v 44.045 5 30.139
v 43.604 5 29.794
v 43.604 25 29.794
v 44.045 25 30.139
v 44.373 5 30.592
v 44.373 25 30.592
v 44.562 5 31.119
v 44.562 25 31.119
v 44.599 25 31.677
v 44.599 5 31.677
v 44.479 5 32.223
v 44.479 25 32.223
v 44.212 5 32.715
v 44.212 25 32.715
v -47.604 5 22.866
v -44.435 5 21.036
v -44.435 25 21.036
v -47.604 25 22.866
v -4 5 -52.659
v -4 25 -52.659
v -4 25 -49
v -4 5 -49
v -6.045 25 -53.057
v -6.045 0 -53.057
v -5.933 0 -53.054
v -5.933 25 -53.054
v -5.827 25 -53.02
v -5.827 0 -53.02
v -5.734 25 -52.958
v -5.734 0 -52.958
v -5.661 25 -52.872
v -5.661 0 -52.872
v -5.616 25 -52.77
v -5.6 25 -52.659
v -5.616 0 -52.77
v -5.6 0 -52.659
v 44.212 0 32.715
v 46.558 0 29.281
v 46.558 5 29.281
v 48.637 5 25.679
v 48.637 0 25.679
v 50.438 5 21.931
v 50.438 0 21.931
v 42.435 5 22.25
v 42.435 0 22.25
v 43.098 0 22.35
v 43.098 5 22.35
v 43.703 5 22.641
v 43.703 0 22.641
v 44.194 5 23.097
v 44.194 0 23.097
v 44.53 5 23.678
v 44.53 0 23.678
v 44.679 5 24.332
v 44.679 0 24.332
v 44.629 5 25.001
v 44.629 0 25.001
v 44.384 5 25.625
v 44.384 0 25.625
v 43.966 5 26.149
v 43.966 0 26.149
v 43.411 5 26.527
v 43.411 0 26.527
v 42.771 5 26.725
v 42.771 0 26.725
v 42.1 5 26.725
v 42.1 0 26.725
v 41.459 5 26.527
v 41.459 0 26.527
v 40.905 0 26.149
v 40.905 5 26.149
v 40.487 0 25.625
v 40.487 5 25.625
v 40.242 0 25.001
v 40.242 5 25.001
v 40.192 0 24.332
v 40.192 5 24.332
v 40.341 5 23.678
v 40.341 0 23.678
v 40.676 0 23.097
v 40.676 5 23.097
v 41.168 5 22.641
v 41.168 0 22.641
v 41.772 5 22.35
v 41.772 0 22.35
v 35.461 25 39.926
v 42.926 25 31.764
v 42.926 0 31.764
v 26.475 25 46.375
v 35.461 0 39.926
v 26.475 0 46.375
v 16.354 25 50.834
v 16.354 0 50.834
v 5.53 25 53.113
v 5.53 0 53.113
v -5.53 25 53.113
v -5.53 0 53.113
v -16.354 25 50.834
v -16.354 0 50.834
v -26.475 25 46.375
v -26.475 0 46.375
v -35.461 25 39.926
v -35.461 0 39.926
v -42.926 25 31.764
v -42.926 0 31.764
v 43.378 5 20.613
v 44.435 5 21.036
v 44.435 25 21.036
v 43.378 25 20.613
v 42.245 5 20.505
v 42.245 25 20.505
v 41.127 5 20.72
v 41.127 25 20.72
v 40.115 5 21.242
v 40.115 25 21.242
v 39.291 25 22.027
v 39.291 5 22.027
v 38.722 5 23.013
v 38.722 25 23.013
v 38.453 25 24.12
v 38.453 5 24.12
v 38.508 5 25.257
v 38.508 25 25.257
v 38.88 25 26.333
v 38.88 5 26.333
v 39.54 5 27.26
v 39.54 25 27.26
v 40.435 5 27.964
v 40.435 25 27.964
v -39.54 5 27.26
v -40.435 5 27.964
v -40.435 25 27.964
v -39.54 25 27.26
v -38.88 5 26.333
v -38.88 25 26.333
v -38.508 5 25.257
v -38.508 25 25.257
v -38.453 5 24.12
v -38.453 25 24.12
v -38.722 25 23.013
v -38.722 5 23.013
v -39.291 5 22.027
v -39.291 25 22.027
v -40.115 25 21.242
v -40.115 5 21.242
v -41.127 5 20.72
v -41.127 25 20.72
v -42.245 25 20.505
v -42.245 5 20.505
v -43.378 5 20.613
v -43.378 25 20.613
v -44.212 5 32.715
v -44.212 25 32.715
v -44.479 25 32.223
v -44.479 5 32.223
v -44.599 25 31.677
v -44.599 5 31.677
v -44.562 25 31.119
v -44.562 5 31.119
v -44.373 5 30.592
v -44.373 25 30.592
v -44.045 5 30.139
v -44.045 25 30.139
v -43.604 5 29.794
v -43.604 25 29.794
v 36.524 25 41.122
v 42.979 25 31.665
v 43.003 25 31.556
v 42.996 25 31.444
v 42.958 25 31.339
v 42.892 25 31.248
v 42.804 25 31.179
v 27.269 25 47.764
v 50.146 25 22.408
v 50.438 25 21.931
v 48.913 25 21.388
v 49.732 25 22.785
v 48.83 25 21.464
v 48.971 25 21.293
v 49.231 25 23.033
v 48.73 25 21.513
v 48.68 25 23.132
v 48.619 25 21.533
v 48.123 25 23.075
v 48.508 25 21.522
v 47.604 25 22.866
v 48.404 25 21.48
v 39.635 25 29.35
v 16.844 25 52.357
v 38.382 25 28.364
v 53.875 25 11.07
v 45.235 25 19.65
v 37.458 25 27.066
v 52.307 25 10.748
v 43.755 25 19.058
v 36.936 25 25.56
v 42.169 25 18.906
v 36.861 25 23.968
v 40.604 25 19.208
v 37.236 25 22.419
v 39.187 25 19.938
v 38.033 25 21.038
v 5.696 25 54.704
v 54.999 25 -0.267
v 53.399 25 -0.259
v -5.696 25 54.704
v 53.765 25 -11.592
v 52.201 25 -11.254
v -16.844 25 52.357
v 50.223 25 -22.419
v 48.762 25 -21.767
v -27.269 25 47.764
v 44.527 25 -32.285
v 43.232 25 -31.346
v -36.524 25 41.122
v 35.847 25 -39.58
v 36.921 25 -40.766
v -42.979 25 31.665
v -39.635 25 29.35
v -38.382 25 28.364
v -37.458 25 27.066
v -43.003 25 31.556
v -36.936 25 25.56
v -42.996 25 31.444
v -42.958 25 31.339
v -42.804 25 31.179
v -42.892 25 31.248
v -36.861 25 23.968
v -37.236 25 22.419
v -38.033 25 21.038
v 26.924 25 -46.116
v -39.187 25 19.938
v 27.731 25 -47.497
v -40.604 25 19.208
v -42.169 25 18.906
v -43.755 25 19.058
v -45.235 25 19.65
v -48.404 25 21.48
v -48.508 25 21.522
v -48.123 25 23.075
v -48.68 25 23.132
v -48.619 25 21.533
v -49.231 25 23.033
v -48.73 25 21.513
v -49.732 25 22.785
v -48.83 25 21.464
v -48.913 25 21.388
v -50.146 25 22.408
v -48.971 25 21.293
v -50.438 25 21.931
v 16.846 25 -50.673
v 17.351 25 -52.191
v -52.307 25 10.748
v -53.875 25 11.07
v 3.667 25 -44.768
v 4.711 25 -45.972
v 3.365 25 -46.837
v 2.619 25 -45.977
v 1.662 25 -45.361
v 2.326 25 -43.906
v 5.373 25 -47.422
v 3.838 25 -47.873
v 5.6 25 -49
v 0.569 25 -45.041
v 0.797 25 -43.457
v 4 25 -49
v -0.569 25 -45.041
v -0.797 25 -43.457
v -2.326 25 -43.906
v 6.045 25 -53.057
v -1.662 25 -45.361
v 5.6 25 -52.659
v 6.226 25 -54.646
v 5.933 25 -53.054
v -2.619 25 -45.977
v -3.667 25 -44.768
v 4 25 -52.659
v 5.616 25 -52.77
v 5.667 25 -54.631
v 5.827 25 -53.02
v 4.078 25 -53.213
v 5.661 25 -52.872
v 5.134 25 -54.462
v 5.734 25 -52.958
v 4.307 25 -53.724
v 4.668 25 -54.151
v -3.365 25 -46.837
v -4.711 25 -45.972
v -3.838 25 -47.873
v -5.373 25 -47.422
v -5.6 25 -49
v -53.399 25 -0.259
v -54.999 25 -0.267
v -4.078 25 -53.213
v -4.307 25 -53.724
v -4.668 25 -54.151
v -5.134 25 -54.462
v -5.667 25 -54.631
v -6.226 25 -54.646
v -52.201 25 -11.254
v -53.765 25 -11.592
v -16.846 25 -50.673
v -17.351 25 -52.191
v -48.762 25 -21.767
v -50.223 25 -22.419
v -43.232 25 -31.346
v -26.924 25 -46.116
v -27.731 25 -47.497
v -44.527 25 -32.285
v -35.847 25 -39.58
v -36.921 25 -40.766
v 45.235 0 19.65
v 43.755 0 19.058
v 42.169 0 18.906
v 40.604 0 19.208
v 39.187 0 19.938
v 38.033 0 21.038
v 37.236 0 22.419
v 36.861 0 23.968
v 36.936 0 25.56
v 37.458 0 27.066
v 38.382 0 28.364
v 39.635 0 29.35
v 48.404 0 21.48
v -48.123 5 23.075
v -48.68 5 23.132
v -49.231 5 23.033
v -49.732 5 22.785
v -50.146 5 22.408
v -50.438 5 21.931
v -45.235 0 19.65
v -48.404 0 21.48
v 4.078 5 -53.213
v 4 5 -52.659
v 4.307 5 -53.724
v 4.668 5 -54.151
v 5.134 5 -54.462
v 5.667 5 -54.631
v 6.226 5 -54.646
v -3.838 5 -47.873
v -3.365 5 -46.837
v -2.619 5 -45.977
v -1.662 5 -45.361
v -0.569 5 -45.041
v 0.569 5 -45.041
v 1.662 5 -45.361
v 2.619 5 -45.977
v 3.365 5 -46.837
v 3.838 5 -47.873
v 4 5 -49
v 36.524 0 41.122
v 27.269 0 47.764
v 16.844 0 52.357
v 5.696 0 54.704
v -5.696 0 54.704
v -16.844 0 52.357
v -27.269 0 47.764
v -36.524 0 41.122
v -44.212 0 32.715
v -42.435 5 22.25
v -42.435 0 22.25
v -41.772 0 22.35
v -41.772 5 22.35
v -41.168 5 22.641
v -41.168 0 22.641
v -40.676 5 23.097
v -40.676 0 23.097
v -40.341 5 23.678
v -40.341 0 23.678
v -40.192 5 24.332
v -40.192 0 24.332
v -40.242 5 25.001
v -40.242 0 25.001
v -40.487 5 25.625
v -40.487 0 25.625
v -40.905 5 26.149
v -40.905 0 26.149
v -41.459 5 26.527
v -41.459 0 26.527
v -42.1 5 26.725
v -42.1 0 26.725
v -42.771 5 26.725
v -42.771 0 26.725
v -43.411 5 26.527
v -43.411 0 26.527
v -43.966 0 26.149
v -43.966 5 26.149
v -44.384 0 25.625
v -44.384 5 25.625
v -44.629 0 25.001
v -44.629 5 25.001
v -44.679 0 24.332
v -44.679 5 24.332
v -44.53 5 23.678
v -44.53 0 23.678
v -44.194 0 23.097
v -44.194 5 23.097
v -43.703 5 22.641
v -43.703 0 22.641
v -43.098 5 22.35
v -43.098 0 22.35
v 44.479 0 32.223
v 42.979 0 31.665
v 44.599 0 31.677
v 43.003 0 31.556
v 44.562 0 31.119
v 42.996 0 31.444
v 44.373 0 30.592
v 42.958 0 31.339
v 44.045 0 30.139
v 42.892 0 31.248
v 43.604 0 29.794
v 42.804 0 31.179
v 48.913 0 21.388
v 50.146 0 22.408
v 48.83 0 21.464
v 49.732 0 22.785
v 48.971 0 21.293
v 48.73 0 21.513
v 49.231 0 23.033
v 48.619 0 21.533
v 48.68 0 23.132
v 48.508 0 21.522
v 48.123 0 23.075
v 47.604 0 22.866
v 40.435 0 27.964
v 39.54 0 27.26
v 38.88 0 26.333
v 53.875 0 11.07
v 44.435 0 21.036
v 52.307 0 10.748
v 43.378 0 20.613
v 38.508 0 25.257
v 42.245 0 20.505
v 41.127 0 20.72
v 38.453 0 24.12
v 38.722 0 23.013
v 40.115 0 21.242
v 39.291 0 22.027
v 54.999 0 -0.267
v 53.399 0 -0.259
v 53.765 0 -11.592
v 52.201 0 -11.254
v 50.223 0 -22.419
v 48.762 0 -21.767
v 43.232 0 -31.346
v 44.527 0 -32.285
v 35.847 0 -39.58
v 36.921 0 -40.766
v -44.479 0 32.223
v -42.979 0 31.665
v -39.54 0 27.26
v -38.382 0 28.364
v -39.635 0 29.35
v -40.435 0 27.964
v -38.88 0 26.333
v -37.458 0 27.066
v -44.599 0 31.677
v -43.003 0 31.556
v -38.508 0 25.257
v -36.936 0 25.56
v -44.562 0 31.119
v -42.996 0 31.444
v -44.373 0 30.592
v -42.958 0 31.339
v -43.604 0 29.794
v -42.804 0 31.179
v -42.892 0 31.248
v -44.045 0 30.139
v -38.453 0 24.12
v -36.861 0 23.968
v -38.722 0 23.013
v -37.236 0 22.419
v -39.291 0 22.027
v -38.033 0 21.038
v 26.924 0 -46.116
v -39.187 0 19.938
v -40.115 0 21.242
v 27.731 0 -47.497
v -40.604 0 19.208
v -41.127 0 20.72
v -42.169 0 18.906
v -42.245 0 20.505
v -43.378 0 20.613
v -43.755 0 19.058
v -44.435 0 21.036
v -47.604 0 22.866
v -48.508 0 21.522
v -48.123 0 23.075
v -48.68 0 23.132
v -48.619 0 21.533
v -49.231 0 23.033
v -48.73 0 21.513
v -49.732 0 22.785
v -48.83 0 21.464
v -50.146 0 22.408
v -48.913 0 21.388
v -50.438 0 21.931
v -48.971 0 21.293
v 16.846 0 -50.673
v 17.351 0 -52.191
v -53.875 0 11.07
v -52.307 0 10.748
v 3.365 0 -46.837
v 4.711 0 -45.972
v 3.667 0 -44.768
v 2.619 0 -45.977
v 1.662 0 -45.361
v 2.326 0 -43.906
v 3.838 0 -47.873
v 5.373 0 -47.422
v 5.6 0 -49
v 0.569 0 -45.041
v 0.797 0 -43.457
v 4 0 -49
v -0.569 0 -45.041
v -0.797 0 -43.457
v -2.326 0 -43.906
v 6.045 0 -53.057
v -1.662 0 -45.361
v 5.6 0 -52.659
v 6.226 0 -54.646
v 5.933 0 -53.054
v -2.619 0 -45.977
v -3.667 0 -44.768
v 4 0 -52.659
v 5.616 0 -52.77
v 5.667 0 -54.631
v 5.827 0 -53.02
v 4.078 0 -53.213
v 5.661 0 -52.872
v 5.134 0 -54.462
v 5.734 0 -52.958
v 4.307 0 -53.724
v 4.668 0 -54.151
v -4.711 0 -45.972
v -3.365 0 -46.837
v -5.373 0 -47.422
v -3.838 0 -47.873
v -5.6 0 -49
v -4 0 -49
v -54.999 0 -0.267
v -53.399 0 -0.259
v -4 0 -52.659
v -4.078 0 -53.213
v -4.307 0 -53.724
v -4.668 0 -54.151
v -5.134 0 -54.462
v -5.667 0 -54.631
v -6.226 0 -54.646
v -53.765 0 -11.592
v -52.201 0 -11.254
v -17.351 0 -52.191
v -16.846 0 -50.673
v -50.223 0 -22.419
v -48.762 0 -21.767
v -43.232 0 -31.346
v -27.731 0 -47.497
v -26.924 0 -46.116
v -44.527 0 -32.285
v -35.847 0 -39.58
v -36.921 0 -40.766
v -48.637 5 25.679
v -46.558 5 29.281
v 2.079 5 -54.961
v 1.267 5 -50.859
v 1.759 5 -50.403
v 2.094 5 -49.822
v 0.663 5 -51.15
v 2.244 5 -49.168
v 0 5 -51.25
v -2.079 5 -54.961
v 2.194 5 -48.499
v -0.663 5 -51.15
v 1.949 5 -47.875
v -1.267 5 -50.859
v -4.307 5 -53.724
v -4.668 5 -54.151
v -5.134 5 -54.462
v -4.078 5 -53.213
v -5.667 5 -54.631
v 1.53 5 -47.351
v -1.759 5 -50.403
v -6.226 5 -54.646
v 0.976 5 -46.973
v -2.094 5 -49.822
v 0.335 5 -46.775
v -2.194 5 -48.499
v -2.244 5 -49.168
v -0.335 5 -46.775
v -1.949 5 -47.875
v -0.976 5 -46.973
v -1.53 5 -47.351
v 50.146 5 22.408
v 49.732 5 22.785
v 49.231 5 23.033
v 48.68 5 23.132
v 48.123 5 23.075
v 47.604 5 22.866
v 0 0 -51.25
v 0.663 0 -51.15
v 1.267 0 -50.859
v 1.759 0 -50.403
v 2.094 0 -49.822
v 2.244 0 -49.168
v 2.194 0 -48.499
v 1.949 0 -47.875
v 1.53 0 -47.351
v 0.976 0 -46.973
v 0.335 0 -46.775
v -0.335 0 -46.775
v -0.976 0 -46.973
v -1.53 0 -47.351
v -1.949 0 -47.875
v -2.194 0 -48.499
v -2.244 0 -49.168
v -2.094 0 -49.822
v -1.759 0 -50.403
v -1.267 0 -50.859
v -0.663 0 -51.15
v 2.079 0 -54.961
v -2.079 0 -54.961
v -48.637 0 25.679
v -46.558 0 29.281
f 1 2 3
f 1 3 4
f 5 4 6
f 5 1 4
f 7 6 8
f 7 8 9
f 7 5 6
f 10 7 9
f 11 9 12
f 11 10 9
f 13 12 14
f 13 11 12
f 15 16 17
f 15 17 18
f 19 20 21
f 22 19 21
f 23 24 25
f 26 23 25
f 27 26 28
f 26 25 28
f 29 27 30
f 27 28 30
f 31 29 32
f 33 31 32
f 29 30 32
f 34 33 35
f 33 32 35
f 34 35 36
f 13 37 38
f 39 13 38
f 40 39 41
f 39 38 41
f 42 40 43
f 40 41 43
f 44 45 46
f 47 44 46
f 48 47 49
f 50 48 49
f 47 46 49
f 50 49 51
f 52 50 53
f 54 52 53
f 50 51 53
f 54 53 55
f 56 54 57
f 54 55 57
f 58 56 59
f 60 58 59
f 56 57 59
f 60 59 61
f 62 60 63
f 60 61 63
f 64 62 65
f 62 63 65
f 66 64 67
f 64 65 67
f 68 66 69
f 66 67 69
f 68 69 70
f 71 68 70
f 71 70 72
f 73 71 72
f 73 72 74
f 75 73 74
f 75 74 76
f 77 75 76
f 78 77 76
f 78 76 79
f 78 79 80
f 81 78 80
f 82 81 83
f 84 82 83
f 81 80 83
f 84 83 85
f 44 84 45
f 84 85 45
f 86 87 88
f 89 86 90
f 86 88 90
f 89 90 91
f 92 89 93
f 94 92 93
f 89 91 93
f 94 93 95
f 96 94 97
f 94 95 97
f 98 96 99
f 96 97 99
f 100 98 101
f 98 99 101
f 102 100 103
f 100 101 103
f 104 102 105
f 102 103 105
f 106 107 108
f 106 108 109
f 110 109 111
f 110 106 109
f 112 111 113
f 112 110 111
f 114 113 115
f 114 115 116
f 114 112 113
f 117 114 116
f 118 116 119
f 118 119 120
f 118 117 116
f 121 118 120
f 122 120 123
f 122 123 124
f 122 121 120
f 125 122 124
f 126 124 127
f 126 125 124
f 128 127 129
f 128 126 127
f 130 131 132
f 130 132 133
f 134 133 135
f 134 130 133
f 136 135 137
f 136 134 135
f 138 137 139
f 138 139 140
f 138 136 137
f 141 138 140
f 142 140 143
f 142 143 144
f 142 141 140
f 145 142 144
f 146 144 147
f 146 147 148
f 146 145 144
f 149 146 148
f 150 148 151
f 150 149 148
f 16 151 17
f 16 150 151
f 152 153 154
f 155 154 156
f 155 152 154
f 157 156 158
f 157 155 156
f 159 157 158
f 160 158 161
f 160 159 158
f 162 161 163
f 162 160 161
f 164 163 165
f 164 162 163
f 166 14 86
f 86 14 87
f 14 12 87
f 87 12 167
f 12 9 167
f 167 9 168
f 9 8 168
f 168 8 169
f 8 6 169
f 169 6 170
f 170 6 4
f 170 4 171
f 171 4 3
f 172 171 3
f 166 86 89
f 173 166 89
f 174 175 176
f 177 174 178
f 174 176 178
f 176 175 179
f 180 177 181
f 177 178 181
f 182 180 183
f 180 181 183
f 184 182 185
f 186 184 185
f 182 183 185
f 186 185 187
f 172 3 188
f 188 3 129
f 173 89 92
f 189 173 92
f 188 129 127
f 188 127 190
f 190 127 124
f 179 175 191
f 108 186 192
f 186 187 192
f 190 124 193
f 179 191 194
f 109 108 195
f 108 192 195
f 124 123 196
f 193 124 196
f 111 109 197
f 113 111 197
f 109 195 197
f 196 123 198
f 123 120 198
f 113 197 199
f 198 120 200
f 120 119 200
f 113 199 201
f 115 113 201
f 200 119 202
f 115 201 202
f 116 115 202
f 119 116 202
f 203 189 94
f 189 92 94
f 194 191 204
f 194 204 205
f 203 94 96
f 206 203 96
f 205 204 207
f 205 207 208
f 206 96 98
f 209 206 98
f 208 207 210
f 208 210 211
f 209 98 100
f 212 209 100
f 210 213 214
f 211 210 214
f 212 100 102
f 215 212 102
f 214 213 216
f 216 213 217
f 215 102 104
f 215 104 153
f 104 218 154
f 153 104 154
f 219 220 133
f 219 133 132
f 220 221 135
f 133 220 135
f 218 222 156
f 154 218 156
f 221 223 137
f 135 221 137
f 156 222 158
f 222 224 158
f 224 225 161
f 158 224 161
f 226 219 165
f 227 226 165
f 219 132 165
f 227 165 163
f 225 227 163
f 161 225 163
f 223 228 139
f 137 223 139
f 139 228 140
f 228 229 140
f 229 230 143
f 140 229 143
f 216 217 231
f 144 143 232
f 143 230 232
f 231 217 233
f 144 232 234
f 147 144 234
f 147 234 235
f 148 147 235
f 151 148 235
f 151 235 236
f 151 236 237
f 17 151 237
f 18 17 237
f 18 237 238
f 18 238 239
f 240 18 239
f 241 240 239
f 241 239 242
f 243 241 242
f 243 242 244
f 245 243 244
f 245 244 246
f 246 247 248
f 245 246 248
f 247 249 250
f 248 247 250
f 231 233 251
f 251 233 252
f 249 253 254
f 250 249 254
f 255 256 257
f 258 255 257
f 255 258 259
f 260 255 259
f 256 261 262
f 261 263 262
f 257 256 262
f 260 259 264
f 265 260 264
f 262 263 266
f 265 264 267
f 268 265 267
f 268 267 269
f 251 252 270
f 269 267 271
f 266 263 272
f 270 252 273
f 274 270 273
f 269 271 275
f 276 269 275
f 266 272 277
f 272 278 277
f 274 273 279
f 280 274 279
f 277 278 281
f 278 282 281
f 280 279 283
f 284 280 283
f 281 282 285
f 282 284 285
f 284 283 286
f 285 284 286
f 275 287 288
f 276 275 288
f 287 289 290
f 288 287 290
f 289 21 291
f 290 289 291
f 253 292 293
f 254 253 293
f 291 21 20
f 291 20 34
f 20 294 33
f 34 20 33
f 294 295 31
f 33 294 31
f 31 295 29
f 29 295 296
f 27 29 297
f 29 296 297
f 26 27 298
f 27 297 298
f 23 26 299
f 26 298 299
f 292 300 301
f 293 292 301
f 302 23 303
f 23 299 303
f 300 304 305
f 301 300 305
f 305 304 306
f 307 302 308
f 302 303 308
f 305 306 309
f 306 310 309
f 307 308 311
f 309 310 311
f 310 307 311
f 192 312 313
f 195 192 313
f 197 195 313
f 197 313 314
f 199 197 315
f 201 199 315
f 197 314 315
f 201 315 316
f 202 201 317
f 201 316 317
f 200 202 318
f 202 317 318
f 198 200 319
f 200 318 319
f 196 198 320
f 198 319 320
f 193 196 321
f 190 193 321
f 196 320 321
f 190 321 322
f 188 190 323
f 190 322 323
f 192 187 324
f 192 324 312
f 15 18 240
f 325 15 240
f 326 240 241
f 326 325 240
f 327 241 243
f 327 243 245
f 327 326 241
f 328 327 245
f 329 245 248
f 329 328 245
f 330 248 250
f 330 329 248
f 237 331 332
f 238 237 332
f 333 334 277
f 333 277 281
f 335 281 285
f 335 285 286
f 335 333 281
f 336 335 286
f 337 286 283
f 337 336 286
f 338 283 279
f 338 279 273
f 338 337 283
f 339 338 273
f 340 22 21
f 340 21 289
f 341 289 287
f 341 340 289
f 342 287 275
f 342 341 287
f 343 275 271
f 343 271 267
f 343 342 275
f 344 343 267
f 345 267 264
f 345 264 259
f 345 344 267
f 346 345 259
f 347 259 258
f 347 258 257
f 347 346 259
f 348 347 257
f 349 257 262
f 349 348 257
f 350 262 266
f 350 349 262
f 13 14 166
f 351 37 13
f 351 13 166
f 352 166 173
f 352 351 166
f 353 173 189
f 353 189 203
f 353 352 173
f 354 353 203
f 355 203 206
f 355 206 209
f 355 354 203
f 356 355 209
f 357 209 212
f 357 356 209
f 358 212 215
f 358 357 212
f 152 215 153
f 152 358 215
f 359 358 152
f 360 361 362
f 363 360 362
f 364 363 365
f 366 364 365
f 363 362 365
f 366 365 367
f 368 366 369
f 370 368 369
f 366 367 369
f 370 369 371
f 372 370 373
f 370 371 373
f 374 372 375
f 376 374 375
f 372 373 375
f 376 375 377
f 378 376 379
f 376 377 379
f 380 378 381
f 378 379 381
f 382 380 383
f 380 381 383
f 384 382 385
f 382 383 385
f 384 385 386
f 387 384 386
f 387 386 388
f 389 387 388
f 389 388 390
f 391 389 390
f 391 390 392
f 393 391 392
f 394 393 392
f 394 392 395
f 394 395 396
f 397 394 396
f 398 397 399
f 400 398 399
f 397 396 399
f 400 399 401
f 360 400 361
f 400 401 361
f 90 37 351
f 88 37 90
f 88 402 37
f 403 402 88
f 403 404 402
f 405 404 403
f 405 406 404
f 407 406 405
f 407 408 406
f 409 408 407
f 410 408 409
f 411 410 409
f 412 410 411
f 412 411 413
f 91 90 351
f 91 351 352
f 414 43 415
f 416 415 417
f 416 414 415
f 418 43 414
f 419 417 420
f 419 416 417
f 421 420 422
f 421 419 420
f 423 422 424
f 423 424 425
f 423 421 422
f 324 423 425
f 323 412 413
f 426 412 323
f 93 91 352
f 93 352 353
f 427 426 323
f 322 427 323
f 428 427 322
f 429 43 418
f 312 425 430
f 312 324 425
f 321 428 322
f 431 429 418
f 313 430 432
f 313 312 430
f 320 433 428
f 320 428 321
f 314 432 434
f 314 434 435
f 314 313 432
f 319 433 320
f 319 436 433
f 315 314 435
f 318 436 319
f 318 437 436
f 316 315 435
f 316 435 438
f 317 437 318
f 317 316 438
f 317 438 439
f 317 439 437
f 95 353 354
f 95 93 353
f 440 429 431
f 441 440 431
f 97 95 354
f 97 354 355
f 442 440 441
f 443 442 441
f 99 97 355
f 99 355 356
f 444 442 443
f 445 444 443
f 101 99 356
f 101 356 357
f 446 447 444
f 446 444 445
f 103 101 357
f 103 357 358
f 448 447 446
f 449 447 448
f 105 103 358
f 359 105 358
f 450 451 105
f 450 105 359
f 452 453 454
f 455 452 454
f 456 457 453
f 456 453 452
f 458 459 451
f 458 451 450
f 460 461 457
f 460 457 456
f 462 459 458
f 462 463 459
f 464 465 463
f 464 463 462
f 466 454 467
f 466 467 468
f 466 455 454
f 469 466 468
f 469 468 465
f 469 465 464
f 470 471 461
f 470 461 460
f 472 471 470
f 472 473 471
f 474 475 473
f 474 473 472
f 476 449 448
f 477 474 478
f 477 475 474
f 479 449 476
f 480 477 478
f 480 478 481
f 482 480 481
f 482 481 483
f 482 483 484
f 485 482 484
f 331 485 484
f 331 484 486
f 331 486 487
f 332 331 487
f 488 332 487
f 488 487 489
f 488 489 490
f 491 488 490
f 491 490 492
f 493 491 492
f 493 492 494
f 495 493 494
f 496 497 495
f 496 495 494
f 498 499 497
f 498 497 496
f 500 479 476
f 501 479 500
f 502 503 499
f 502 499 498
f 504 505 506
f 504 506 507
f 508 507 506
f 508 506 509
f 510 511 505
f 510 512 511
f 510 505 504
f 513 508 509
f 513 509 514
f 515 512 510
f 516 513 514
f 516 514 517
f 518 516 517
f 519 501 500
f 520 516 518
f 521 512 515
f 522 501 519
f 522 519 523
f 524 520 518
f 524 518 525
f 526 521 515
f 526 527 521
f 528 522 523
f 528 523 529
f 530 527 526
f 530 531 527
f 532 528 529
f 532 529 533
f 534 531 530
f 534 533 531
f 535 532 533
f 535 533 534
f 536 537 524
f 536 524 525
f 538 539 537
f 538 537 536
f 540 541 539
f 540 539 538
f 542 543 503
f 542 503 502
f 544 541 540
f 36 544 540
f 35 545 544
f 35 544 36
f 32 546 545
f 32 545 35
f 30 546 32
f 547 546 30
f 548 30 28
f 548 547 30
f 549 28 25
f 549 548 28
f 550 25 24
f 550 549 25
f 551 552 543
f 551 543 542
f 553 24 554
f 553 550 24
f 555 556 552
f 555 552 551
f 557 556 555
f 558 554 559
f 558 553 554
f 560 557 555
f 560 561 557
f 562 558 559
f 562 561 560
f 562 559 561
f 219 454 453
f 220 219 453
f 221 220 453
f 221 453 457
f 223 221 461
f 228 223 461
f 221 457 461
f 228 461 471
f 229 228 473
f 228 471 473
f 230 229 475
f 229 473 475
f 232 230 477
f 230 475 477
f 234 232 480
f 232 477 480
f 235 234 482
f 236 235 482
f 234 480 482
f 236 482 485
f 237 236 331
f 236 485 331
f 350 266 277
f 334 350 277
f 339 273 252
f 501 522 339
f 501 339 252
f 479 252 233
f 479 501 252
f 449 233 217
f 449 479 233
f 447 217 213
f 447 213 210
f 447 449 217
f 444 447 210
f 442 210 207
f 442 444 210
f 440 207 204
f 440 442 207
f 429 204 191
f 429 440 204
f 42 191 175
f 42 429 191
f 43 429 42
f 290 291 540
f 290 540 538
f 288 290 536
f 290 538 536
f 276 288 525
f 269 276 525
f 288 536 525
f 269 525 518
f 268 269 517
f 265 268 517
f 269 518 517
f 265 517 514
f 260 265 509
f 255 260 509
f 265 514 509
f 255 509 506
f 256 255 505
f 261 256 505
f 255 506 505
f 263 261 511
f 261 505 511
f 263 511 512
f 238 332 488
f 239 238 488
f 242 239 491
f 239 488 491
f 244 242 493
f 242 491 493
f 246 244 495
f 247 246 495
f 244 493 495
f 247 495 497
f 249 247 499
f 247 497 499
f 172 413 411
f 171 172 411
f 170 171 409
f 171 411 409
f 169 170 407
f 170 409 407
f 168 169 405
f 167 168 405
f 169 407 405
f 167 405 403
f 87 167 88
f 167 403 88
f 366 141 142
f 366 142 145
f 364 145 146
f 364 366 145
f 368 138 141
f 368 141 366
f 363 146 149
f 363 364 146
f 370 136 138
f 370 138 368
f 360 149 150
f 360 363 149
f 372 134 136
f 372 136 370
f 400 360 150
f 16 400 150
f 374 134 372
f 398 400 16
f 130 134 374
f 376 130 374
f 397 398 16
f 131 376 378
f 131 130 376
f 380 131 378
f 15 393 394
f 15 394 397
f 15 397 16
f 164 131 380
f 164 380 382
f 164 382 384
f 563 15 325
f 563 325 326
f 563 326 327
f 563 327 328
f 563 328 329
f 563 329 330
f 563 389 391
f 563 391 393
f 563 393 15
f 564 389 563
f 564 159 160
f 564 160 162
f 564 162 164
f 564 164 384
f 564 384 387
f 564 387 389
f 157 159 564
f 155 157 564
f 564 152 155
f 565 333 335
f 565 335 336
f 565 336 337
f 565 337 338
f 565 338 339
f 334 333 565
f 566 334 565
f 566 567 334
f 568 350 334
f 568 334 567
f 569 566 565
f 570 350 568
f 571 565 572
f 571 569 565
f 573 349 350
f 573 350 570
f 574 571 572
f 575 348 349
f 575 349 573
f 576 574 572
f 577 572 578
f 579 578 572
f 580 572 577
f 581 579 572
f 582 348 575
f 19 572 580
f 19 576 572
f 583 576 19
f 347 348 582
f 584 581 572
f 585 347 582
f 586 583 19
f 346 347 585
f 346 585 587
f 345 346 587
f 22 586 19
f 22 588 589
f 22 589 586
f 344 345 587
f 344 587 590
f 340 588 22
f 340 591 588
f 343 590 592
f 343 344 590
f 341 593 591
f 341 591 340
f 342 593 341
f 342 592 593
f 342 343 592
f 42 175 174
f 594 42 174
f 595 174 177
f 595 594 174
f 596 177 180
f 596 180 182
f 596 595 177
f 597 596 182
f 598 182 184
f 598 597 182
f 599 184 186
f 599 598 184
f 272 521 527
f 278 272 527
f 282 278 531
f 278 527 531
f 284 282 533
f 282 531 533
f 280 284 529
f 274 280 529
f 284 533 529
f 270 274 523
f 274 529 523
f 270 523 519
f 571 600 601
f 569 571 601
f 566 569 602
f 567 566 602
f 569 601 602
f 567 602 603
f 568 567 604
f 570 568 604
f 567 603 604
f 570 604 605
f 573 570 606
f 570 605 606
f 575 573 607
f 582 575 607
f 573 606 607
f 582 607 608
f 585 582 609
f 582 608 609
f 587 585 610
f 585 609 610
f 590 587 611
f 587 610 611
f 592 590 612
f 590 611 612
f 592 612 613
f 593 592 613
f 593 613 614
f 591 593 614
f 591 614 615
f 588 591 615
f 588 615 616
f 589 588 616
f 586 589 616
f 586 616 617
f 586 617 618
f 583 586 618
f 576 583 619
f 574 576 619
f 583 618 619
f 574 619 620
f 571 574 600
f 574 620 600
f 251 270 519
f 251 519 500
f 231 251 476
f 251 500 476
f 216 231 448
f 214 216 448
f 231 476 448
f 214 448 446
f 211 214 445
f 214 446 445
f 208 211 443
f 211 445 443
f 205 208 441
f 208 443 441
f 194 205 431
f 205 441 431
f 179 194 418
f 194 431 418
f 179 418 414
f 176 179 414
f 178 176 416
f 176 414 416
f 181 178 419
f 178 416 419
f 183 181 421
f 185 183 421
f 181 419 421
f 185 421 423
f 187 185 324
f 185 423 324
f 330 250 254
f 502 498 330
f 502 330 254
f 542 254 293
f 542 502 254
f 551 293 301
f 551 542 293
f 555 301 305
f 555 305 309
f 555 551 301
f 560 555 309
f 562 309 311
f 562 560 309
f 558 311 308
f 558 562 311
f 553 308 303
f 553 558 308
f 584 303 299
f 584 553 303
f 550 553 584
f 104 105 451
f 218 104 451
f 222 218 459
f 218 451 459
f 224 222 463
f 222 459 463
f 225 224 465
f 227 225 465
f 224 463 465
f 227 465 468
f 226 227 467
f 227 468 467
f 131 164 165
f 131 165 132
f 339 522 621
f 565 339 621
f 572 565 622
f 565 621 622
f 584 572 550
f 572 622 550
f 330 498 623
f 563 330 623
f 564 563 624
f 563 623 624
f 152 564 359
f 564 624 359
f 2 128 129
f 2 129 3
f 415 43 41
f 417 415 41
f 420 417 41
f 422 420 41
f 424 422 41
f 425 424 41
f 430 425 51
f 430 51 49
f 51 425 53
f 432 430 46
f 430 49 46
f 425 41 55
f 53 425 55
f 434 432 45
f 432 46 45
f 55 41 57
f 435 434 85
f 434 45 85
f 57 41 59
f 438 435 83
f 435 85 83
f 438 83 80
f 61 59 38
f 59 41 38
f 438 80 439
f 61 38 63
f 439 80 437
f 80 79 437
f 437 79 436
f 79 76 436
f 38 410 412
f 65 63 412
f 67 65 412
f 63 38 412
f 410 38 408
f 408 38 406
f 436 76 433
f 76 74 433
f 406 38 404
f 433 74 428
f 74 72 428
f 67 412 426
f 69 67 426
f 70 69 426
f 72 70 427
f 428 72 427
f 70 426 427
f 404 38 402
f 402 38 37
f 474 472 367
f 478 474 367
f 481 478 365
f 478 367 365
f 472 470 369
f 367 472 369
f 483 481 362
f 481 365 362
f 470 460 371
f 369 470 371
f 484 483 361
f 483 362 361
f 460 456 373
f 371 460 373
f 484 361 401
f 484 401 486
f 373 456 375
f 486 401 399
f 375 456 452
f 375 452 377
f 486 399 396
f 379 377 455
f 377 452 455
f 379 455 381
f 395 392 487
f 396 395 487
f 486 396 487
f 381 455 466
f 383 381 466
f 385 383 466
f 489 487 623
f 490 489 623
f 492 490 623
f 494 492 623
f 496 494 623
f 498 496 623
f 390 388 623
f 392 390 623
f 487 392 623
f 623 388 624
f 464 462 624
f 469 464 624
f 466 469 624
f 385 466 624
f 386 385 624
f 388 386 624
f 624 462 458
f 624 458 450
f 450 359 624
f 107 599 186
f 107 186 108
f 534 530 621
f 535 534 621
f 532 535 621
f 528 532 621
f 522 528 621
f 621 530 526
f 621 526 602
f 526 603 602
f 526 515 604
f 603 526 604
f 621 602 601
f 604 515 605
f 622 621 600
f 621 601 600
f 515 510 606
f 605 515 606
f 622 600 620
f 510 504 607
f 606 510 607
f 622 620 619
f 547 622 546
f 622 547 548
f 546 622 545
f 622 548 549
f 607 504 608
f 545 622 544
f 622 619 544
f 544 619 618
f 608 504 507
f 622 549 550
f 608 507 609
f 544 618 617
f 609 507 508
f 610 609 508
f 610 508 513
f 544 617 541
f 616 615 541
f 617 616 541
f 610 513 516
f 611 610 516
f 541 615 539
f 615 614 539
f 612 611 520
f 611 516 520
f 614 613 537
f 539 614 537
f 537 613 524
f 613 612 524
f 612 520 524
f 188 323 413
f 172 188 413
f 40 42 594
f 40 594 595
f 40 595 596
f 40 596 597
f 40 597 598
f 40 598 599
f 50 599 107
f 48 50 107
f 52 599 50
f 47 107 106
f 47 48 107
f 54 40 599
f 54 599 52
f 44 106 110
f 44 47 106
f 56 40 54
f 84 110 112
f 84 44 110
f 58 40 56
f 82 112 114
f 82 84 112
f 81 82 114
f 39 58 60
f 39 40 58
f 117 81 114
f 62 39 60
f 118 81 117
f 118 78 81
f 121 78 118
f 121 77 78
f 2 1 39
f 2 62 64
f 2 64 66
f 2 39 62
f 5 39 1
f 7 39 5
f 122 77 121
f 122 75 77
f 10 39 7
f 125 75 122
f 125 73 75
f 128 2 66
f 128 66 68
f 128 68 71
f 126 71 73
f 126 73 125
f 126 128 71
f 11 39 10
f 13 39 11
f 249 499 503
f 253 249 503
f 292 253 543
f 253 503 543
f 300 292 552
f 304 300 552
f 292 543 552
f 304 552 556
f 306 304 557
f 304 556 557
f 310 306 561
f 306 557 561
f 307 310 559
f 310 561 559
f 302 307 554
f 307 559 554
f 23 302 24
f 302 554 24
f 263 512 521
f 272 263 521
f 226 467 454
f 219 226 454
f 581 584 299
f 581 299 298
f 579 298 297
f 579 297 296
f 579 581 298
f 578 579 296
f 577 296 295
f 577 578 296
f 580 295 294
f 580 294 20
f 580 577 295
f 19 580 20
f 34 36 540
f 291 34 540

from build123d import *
from build123d.topology import SkipClean

# Parameters (mm, degrees)
EXTRUDE_THIN1_DEPTH = 25
SKETCH3_R           = 2.25
BOSS_EXTRUDE1_DEPTH = 5


with BuildPart() as part:
    # Sketch2 → Extrude-Thin1 (new body)
    with BuildSketch(Plane(origin=(0, 0, 0), x_dir=(1, 0, 0), z_dir=(0, 1, 0))):
        with BuildLine():
            Line((-4, 52.659282183), (-4, 49))
            ThreePointArc((-4, 49), (0, 45), (4, 49))
            Line((4, 49), (4, 52.659282183))
            ThreePointArc((4, 52.659282183), (4.668239922, 54.151399837), (6.226415094, 54.646424907))
            ThreePointArc((6.226415094, 54.646424907), (47.631397208, 27.5), (50.438399742, -21.930978807))
            ThreePointArc((50.438399742, -21.930978807), (49.23060787, -23.032885555), (47.604276115, -22.865539476))
            Line((47.604276115, -22.865539476), (44.435244785, -21.035898385))
            ThreePointArc((44.435244785, -21.035898385), (38.97114317, -22.5), (40.435244785, -27.964101615))
            Line((40.435244785, -27.964101615), (43.604276115, -29.793742707))
            ThreePointArc((43.604276115, -29.793742707), (44.562367948, -31.118514282), (44.211984648, -32.7154461))
            ThreePointArc((44.211984648, -32.7154461), (0, -55), (-44.211984648, -32.715446099))
            ThreePointArc((-44.211984648, -32.715446099), (-44.562367948, -31.118514282), (-43.604276115, -29.793742706))
            Line((-43.604276115, -29.793742706), (-40.435244785, -27.964101615))
            ThreePointArc((-40.435244785, -27.964101615), (-38.97114317, -22.5), (-44.435244785, -21.035898385))
            Line((-44.435244785, -21.035898385), (-47.604276115, -22.865539476))
            ThreePointArc((-47.604276115, -22.865539476), (-49.23060787, -23.032885555), (-50.438399742, -21.930978807))
            ThreePointArc((-50.438399742, -21.930978807), (-47.631397208, 27.5), (-6.226415094, 54.646424907))
            ThreePointArc((-6.226415094, 54.646424907), (-4.668239922, 54.151399837), (-4, 52.659282183))
        make_face()
        with BuildLine():
            Line((-5.6, 52.659282183), (-5.6, 49))
            ThreePointArc((-5.6, 49), (0, 43.4), (5.6, 49))
            Line((5.6, 49), (5.6, 52.659282183))
            ThreePointArc((5.6, 52.659282183), (5.733647984, 52.957705714), (6.045283019, 53.056710728))
            ThreePointArc((6.045283019, 53.056710728), (46.245756562, 26.7), (48.971100841, -21.292986696))
            ThreePointArc((48.971100841, -21.292986696), (48.729542466, -21.513368046), (48.404276115, -21.47989883))
            Line((48.404276115, -21.47989883), (45.235244785, -19.650257739))
            ThreePointArc((45.235244785, -19.650257739), (37.585502524, -21.7), (39.635244785, -29.349742261))
            Line((39.635244785, -29.349742261), (42.804276115, -31.179383353))
            ThreePointArc((42.804276115, -31.179383353), (42.995894482, -31.444337668), (42.925817822, -31.763724031))
            ThreePointArc((42.925817822, -31.763724031), (0, -53.4), (-42.925817822, -31.763724031))
            ThreePointArc((-42.925817822, -31.763724031), (-42.995894482, -31.444337668), (-42.804276115, -31.179383353))
            Line((-42.804276115, -31.179383353), (-39.635244785, -29.349742261))
            ThreePointArc((-39.635244785, -29.349742261), (-37.585502524, -21.7), (-45.235244785, -19.650257739))
            Line((-45.235244785, -19.650257739), (-48.404276115, -21.47989883))
            ThreePointArc((-48.404276115, -21.47989883), (-48.729542466, -21.513368046), (-48.971100841, -21.292986696))
            ThreePointArc((-48.971100841, -21.292986696), (-46.245756562, 26.7), (-6.045283019, 53.056710728))
            ThreePointArc((-6.045283019, 53.056710728), (-5.733647984, 52.957705714), (-5.6, 52.659282183))
        make_face(mode=Mode.SUBTRACT)
    extrude(amount=EXTRUDE_THIN1_DEPTH)

    # Sketch3 → Boss-Extrude1 (add)
    # profile 1 of 3: a face of its own
    with SkipClean():  # the faces are left unmerged after this step: merging them gives an invalid solid
        with BuildSketch(Plane.XZ):
            with BuildLine():
                Line((-43.604276115, 29.793742706), (-40.435244785, 27.964101615))
                ThreePointArc((-40.435244785, 27.964101615), (-38.97114317, 22.5), (-44.435244785, 21.035898385))
                Line((-44.435244785, 21.035898385), (-47.604276115, 22.865539476))
                ThreePointArc((-47.604276115, 22.865539476), (-49.23060787, 23.032885555), (-50.438399742, 21.930978807))
                ThreePointArc((-50.438399742, 21.930978807), (-47.631397208, 27.5), (-44.211984648, 32.715446099))
                ThreePointArc((-44.211984648, 32.715446099), (-44.562367948, 31.118514282), (-43.604276115, 29.793742706))
            make_face()
            with Locations(Location((-42.435244785, 24.5, 0), (0, 0, 270))):
                Circle(SKETCH3_R, mode=Mode.SUBTRACT)
        # profile 2 of 3: a face of its own
        with BuildSketch(Plane.XZ):
            with BuildLine():
                Line((-4, -52.659282183), (-4, -49))
                ThreePointArc((-4, -49), (0, -45), (4, -49))
                Line((4, -49), (4, -52.659282183))
                ThreePointArc((4, -52.659282183), (4.668239922, -54.151399837), (6.226415094, -54.646424907))
                ThreePointArc((6.226415094, -54.646424907), (0, -55), (-6.226415094, -54.646424907))
                ThreePointArc((-6.226415094, -54.646424907), (-4.668239922, -54.151399837), (-4, -52.659282183))
            make_face()
            with Locations(Location((0, -49, 0), (0, 0, 270))):
                Circle(SKETCH3_R, mode=Mode.SUBTRACT)
        # profile 3 of 3: a face of its own
        with BuildSketch(Plane.XZ):
            with BuildLine():
                Line((47.604276115, 22.865539476), (44.435244785, 21.035898385))
                ThreePointArc((44.435244785, 21.035898385), (38.97114317, 22.5), (40.435244785, 27.964101615))
                Line((40.435244785, 27.964101615), (43.604276115, 29.793742707))
                ThreePointArc((43.604276115, 29.793742707), (44.562367948, 31.118514282), (44.211984648, 32.7154461))
                ThreePointArc((44.211984648, 32.7154461), (47.631397208, 27.5), (50.438399742, 21.930978807))
                ThreePointArc((50.438399742, 21.930978807), (49.23060787, 23.032885555), (47.604276115, 22.865539476))
            make_face()
            with Locations(Location((42.435244785, 24.5, 0), (0, 0, 270))):
                Circle(SKETCH3_R, mode=Mode.SUBTRACT)
        extrude(amount=-BOSS_EXTRUDE1_DEPTH)


solid = part.part
